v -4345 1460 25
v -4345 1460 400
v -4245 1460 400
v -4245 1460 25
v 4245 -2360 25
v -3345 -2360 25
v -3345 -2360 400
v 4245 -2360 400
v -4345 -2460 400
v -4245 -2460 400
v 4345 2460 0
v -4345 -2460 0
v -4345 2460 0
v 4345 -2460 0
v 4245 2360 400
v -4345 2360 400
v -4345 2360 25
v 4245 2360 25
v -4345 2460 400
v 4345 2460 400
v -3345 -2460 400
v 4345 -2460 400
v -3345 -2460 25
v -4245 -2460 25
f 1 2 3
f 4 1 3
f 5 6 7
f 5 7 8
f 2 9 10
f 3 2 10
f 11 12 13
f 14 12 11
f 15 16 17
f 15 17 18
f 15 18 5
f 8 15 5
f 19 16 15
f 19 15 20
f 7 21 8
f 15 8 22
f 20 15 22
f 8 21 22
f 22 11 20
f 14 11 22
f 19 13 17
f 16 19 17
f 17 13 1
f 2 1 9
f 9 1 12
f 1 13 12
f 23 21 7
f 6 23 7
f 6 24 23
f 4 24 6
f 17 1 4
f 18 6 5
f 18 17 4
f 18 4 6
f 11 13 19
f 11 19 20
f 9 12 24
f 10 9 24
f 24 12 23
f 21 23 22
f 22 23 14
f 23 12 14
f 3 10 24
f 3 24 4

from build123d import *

# Parameters (mm, degrees)
F0_W     = 8490
F0_H     = 4720
F1_DEPTH = 25
F2_W     = 8690
F2_H     = 4920
F2_W_2   = 8490
F2_H_2   = 4720
F3_DEPTH = 400
F4_W     = 100
F4_H     = 900
F4_W_2   = 900
F4_H_2   = 100
F5_DEPTH = 375


with BuildPart() as f1:
    # F0 (on Top) → F1 (new body)
    with BuildSketch(Plane.XY):
        Rectangle(F0_W, F0_H)
    extrude(amount=F1_DEPTH)

    # F2 (on face) → F3 (join)
    with BuildSketch(Plane(origin=(0, 0, 0), x_dir=(1, 0, 0), z_dir=(0, 0, -1))):
        Rectangle(F2_W, F2_H)
        Rectangle(F2_W_2, F2_H_2, mode=Mode.SUBTRACT)
    extrude(amount=-F3_DEPTH)

    # F4 (on face) → F5 (cut, through all)
    with BuildSketch(Plane.XY.offset(400)):
        with Locations((-4295, 1910)):
            Rectangle(F4_W, F4_H)
        with Locations((-3795, -2410)):
            Rectangle(F4_W_2, F4_H_2)
    extrude(amount=-F5_DEPTH, mode=Mode.SUBTRACT)


solid = f1.part
